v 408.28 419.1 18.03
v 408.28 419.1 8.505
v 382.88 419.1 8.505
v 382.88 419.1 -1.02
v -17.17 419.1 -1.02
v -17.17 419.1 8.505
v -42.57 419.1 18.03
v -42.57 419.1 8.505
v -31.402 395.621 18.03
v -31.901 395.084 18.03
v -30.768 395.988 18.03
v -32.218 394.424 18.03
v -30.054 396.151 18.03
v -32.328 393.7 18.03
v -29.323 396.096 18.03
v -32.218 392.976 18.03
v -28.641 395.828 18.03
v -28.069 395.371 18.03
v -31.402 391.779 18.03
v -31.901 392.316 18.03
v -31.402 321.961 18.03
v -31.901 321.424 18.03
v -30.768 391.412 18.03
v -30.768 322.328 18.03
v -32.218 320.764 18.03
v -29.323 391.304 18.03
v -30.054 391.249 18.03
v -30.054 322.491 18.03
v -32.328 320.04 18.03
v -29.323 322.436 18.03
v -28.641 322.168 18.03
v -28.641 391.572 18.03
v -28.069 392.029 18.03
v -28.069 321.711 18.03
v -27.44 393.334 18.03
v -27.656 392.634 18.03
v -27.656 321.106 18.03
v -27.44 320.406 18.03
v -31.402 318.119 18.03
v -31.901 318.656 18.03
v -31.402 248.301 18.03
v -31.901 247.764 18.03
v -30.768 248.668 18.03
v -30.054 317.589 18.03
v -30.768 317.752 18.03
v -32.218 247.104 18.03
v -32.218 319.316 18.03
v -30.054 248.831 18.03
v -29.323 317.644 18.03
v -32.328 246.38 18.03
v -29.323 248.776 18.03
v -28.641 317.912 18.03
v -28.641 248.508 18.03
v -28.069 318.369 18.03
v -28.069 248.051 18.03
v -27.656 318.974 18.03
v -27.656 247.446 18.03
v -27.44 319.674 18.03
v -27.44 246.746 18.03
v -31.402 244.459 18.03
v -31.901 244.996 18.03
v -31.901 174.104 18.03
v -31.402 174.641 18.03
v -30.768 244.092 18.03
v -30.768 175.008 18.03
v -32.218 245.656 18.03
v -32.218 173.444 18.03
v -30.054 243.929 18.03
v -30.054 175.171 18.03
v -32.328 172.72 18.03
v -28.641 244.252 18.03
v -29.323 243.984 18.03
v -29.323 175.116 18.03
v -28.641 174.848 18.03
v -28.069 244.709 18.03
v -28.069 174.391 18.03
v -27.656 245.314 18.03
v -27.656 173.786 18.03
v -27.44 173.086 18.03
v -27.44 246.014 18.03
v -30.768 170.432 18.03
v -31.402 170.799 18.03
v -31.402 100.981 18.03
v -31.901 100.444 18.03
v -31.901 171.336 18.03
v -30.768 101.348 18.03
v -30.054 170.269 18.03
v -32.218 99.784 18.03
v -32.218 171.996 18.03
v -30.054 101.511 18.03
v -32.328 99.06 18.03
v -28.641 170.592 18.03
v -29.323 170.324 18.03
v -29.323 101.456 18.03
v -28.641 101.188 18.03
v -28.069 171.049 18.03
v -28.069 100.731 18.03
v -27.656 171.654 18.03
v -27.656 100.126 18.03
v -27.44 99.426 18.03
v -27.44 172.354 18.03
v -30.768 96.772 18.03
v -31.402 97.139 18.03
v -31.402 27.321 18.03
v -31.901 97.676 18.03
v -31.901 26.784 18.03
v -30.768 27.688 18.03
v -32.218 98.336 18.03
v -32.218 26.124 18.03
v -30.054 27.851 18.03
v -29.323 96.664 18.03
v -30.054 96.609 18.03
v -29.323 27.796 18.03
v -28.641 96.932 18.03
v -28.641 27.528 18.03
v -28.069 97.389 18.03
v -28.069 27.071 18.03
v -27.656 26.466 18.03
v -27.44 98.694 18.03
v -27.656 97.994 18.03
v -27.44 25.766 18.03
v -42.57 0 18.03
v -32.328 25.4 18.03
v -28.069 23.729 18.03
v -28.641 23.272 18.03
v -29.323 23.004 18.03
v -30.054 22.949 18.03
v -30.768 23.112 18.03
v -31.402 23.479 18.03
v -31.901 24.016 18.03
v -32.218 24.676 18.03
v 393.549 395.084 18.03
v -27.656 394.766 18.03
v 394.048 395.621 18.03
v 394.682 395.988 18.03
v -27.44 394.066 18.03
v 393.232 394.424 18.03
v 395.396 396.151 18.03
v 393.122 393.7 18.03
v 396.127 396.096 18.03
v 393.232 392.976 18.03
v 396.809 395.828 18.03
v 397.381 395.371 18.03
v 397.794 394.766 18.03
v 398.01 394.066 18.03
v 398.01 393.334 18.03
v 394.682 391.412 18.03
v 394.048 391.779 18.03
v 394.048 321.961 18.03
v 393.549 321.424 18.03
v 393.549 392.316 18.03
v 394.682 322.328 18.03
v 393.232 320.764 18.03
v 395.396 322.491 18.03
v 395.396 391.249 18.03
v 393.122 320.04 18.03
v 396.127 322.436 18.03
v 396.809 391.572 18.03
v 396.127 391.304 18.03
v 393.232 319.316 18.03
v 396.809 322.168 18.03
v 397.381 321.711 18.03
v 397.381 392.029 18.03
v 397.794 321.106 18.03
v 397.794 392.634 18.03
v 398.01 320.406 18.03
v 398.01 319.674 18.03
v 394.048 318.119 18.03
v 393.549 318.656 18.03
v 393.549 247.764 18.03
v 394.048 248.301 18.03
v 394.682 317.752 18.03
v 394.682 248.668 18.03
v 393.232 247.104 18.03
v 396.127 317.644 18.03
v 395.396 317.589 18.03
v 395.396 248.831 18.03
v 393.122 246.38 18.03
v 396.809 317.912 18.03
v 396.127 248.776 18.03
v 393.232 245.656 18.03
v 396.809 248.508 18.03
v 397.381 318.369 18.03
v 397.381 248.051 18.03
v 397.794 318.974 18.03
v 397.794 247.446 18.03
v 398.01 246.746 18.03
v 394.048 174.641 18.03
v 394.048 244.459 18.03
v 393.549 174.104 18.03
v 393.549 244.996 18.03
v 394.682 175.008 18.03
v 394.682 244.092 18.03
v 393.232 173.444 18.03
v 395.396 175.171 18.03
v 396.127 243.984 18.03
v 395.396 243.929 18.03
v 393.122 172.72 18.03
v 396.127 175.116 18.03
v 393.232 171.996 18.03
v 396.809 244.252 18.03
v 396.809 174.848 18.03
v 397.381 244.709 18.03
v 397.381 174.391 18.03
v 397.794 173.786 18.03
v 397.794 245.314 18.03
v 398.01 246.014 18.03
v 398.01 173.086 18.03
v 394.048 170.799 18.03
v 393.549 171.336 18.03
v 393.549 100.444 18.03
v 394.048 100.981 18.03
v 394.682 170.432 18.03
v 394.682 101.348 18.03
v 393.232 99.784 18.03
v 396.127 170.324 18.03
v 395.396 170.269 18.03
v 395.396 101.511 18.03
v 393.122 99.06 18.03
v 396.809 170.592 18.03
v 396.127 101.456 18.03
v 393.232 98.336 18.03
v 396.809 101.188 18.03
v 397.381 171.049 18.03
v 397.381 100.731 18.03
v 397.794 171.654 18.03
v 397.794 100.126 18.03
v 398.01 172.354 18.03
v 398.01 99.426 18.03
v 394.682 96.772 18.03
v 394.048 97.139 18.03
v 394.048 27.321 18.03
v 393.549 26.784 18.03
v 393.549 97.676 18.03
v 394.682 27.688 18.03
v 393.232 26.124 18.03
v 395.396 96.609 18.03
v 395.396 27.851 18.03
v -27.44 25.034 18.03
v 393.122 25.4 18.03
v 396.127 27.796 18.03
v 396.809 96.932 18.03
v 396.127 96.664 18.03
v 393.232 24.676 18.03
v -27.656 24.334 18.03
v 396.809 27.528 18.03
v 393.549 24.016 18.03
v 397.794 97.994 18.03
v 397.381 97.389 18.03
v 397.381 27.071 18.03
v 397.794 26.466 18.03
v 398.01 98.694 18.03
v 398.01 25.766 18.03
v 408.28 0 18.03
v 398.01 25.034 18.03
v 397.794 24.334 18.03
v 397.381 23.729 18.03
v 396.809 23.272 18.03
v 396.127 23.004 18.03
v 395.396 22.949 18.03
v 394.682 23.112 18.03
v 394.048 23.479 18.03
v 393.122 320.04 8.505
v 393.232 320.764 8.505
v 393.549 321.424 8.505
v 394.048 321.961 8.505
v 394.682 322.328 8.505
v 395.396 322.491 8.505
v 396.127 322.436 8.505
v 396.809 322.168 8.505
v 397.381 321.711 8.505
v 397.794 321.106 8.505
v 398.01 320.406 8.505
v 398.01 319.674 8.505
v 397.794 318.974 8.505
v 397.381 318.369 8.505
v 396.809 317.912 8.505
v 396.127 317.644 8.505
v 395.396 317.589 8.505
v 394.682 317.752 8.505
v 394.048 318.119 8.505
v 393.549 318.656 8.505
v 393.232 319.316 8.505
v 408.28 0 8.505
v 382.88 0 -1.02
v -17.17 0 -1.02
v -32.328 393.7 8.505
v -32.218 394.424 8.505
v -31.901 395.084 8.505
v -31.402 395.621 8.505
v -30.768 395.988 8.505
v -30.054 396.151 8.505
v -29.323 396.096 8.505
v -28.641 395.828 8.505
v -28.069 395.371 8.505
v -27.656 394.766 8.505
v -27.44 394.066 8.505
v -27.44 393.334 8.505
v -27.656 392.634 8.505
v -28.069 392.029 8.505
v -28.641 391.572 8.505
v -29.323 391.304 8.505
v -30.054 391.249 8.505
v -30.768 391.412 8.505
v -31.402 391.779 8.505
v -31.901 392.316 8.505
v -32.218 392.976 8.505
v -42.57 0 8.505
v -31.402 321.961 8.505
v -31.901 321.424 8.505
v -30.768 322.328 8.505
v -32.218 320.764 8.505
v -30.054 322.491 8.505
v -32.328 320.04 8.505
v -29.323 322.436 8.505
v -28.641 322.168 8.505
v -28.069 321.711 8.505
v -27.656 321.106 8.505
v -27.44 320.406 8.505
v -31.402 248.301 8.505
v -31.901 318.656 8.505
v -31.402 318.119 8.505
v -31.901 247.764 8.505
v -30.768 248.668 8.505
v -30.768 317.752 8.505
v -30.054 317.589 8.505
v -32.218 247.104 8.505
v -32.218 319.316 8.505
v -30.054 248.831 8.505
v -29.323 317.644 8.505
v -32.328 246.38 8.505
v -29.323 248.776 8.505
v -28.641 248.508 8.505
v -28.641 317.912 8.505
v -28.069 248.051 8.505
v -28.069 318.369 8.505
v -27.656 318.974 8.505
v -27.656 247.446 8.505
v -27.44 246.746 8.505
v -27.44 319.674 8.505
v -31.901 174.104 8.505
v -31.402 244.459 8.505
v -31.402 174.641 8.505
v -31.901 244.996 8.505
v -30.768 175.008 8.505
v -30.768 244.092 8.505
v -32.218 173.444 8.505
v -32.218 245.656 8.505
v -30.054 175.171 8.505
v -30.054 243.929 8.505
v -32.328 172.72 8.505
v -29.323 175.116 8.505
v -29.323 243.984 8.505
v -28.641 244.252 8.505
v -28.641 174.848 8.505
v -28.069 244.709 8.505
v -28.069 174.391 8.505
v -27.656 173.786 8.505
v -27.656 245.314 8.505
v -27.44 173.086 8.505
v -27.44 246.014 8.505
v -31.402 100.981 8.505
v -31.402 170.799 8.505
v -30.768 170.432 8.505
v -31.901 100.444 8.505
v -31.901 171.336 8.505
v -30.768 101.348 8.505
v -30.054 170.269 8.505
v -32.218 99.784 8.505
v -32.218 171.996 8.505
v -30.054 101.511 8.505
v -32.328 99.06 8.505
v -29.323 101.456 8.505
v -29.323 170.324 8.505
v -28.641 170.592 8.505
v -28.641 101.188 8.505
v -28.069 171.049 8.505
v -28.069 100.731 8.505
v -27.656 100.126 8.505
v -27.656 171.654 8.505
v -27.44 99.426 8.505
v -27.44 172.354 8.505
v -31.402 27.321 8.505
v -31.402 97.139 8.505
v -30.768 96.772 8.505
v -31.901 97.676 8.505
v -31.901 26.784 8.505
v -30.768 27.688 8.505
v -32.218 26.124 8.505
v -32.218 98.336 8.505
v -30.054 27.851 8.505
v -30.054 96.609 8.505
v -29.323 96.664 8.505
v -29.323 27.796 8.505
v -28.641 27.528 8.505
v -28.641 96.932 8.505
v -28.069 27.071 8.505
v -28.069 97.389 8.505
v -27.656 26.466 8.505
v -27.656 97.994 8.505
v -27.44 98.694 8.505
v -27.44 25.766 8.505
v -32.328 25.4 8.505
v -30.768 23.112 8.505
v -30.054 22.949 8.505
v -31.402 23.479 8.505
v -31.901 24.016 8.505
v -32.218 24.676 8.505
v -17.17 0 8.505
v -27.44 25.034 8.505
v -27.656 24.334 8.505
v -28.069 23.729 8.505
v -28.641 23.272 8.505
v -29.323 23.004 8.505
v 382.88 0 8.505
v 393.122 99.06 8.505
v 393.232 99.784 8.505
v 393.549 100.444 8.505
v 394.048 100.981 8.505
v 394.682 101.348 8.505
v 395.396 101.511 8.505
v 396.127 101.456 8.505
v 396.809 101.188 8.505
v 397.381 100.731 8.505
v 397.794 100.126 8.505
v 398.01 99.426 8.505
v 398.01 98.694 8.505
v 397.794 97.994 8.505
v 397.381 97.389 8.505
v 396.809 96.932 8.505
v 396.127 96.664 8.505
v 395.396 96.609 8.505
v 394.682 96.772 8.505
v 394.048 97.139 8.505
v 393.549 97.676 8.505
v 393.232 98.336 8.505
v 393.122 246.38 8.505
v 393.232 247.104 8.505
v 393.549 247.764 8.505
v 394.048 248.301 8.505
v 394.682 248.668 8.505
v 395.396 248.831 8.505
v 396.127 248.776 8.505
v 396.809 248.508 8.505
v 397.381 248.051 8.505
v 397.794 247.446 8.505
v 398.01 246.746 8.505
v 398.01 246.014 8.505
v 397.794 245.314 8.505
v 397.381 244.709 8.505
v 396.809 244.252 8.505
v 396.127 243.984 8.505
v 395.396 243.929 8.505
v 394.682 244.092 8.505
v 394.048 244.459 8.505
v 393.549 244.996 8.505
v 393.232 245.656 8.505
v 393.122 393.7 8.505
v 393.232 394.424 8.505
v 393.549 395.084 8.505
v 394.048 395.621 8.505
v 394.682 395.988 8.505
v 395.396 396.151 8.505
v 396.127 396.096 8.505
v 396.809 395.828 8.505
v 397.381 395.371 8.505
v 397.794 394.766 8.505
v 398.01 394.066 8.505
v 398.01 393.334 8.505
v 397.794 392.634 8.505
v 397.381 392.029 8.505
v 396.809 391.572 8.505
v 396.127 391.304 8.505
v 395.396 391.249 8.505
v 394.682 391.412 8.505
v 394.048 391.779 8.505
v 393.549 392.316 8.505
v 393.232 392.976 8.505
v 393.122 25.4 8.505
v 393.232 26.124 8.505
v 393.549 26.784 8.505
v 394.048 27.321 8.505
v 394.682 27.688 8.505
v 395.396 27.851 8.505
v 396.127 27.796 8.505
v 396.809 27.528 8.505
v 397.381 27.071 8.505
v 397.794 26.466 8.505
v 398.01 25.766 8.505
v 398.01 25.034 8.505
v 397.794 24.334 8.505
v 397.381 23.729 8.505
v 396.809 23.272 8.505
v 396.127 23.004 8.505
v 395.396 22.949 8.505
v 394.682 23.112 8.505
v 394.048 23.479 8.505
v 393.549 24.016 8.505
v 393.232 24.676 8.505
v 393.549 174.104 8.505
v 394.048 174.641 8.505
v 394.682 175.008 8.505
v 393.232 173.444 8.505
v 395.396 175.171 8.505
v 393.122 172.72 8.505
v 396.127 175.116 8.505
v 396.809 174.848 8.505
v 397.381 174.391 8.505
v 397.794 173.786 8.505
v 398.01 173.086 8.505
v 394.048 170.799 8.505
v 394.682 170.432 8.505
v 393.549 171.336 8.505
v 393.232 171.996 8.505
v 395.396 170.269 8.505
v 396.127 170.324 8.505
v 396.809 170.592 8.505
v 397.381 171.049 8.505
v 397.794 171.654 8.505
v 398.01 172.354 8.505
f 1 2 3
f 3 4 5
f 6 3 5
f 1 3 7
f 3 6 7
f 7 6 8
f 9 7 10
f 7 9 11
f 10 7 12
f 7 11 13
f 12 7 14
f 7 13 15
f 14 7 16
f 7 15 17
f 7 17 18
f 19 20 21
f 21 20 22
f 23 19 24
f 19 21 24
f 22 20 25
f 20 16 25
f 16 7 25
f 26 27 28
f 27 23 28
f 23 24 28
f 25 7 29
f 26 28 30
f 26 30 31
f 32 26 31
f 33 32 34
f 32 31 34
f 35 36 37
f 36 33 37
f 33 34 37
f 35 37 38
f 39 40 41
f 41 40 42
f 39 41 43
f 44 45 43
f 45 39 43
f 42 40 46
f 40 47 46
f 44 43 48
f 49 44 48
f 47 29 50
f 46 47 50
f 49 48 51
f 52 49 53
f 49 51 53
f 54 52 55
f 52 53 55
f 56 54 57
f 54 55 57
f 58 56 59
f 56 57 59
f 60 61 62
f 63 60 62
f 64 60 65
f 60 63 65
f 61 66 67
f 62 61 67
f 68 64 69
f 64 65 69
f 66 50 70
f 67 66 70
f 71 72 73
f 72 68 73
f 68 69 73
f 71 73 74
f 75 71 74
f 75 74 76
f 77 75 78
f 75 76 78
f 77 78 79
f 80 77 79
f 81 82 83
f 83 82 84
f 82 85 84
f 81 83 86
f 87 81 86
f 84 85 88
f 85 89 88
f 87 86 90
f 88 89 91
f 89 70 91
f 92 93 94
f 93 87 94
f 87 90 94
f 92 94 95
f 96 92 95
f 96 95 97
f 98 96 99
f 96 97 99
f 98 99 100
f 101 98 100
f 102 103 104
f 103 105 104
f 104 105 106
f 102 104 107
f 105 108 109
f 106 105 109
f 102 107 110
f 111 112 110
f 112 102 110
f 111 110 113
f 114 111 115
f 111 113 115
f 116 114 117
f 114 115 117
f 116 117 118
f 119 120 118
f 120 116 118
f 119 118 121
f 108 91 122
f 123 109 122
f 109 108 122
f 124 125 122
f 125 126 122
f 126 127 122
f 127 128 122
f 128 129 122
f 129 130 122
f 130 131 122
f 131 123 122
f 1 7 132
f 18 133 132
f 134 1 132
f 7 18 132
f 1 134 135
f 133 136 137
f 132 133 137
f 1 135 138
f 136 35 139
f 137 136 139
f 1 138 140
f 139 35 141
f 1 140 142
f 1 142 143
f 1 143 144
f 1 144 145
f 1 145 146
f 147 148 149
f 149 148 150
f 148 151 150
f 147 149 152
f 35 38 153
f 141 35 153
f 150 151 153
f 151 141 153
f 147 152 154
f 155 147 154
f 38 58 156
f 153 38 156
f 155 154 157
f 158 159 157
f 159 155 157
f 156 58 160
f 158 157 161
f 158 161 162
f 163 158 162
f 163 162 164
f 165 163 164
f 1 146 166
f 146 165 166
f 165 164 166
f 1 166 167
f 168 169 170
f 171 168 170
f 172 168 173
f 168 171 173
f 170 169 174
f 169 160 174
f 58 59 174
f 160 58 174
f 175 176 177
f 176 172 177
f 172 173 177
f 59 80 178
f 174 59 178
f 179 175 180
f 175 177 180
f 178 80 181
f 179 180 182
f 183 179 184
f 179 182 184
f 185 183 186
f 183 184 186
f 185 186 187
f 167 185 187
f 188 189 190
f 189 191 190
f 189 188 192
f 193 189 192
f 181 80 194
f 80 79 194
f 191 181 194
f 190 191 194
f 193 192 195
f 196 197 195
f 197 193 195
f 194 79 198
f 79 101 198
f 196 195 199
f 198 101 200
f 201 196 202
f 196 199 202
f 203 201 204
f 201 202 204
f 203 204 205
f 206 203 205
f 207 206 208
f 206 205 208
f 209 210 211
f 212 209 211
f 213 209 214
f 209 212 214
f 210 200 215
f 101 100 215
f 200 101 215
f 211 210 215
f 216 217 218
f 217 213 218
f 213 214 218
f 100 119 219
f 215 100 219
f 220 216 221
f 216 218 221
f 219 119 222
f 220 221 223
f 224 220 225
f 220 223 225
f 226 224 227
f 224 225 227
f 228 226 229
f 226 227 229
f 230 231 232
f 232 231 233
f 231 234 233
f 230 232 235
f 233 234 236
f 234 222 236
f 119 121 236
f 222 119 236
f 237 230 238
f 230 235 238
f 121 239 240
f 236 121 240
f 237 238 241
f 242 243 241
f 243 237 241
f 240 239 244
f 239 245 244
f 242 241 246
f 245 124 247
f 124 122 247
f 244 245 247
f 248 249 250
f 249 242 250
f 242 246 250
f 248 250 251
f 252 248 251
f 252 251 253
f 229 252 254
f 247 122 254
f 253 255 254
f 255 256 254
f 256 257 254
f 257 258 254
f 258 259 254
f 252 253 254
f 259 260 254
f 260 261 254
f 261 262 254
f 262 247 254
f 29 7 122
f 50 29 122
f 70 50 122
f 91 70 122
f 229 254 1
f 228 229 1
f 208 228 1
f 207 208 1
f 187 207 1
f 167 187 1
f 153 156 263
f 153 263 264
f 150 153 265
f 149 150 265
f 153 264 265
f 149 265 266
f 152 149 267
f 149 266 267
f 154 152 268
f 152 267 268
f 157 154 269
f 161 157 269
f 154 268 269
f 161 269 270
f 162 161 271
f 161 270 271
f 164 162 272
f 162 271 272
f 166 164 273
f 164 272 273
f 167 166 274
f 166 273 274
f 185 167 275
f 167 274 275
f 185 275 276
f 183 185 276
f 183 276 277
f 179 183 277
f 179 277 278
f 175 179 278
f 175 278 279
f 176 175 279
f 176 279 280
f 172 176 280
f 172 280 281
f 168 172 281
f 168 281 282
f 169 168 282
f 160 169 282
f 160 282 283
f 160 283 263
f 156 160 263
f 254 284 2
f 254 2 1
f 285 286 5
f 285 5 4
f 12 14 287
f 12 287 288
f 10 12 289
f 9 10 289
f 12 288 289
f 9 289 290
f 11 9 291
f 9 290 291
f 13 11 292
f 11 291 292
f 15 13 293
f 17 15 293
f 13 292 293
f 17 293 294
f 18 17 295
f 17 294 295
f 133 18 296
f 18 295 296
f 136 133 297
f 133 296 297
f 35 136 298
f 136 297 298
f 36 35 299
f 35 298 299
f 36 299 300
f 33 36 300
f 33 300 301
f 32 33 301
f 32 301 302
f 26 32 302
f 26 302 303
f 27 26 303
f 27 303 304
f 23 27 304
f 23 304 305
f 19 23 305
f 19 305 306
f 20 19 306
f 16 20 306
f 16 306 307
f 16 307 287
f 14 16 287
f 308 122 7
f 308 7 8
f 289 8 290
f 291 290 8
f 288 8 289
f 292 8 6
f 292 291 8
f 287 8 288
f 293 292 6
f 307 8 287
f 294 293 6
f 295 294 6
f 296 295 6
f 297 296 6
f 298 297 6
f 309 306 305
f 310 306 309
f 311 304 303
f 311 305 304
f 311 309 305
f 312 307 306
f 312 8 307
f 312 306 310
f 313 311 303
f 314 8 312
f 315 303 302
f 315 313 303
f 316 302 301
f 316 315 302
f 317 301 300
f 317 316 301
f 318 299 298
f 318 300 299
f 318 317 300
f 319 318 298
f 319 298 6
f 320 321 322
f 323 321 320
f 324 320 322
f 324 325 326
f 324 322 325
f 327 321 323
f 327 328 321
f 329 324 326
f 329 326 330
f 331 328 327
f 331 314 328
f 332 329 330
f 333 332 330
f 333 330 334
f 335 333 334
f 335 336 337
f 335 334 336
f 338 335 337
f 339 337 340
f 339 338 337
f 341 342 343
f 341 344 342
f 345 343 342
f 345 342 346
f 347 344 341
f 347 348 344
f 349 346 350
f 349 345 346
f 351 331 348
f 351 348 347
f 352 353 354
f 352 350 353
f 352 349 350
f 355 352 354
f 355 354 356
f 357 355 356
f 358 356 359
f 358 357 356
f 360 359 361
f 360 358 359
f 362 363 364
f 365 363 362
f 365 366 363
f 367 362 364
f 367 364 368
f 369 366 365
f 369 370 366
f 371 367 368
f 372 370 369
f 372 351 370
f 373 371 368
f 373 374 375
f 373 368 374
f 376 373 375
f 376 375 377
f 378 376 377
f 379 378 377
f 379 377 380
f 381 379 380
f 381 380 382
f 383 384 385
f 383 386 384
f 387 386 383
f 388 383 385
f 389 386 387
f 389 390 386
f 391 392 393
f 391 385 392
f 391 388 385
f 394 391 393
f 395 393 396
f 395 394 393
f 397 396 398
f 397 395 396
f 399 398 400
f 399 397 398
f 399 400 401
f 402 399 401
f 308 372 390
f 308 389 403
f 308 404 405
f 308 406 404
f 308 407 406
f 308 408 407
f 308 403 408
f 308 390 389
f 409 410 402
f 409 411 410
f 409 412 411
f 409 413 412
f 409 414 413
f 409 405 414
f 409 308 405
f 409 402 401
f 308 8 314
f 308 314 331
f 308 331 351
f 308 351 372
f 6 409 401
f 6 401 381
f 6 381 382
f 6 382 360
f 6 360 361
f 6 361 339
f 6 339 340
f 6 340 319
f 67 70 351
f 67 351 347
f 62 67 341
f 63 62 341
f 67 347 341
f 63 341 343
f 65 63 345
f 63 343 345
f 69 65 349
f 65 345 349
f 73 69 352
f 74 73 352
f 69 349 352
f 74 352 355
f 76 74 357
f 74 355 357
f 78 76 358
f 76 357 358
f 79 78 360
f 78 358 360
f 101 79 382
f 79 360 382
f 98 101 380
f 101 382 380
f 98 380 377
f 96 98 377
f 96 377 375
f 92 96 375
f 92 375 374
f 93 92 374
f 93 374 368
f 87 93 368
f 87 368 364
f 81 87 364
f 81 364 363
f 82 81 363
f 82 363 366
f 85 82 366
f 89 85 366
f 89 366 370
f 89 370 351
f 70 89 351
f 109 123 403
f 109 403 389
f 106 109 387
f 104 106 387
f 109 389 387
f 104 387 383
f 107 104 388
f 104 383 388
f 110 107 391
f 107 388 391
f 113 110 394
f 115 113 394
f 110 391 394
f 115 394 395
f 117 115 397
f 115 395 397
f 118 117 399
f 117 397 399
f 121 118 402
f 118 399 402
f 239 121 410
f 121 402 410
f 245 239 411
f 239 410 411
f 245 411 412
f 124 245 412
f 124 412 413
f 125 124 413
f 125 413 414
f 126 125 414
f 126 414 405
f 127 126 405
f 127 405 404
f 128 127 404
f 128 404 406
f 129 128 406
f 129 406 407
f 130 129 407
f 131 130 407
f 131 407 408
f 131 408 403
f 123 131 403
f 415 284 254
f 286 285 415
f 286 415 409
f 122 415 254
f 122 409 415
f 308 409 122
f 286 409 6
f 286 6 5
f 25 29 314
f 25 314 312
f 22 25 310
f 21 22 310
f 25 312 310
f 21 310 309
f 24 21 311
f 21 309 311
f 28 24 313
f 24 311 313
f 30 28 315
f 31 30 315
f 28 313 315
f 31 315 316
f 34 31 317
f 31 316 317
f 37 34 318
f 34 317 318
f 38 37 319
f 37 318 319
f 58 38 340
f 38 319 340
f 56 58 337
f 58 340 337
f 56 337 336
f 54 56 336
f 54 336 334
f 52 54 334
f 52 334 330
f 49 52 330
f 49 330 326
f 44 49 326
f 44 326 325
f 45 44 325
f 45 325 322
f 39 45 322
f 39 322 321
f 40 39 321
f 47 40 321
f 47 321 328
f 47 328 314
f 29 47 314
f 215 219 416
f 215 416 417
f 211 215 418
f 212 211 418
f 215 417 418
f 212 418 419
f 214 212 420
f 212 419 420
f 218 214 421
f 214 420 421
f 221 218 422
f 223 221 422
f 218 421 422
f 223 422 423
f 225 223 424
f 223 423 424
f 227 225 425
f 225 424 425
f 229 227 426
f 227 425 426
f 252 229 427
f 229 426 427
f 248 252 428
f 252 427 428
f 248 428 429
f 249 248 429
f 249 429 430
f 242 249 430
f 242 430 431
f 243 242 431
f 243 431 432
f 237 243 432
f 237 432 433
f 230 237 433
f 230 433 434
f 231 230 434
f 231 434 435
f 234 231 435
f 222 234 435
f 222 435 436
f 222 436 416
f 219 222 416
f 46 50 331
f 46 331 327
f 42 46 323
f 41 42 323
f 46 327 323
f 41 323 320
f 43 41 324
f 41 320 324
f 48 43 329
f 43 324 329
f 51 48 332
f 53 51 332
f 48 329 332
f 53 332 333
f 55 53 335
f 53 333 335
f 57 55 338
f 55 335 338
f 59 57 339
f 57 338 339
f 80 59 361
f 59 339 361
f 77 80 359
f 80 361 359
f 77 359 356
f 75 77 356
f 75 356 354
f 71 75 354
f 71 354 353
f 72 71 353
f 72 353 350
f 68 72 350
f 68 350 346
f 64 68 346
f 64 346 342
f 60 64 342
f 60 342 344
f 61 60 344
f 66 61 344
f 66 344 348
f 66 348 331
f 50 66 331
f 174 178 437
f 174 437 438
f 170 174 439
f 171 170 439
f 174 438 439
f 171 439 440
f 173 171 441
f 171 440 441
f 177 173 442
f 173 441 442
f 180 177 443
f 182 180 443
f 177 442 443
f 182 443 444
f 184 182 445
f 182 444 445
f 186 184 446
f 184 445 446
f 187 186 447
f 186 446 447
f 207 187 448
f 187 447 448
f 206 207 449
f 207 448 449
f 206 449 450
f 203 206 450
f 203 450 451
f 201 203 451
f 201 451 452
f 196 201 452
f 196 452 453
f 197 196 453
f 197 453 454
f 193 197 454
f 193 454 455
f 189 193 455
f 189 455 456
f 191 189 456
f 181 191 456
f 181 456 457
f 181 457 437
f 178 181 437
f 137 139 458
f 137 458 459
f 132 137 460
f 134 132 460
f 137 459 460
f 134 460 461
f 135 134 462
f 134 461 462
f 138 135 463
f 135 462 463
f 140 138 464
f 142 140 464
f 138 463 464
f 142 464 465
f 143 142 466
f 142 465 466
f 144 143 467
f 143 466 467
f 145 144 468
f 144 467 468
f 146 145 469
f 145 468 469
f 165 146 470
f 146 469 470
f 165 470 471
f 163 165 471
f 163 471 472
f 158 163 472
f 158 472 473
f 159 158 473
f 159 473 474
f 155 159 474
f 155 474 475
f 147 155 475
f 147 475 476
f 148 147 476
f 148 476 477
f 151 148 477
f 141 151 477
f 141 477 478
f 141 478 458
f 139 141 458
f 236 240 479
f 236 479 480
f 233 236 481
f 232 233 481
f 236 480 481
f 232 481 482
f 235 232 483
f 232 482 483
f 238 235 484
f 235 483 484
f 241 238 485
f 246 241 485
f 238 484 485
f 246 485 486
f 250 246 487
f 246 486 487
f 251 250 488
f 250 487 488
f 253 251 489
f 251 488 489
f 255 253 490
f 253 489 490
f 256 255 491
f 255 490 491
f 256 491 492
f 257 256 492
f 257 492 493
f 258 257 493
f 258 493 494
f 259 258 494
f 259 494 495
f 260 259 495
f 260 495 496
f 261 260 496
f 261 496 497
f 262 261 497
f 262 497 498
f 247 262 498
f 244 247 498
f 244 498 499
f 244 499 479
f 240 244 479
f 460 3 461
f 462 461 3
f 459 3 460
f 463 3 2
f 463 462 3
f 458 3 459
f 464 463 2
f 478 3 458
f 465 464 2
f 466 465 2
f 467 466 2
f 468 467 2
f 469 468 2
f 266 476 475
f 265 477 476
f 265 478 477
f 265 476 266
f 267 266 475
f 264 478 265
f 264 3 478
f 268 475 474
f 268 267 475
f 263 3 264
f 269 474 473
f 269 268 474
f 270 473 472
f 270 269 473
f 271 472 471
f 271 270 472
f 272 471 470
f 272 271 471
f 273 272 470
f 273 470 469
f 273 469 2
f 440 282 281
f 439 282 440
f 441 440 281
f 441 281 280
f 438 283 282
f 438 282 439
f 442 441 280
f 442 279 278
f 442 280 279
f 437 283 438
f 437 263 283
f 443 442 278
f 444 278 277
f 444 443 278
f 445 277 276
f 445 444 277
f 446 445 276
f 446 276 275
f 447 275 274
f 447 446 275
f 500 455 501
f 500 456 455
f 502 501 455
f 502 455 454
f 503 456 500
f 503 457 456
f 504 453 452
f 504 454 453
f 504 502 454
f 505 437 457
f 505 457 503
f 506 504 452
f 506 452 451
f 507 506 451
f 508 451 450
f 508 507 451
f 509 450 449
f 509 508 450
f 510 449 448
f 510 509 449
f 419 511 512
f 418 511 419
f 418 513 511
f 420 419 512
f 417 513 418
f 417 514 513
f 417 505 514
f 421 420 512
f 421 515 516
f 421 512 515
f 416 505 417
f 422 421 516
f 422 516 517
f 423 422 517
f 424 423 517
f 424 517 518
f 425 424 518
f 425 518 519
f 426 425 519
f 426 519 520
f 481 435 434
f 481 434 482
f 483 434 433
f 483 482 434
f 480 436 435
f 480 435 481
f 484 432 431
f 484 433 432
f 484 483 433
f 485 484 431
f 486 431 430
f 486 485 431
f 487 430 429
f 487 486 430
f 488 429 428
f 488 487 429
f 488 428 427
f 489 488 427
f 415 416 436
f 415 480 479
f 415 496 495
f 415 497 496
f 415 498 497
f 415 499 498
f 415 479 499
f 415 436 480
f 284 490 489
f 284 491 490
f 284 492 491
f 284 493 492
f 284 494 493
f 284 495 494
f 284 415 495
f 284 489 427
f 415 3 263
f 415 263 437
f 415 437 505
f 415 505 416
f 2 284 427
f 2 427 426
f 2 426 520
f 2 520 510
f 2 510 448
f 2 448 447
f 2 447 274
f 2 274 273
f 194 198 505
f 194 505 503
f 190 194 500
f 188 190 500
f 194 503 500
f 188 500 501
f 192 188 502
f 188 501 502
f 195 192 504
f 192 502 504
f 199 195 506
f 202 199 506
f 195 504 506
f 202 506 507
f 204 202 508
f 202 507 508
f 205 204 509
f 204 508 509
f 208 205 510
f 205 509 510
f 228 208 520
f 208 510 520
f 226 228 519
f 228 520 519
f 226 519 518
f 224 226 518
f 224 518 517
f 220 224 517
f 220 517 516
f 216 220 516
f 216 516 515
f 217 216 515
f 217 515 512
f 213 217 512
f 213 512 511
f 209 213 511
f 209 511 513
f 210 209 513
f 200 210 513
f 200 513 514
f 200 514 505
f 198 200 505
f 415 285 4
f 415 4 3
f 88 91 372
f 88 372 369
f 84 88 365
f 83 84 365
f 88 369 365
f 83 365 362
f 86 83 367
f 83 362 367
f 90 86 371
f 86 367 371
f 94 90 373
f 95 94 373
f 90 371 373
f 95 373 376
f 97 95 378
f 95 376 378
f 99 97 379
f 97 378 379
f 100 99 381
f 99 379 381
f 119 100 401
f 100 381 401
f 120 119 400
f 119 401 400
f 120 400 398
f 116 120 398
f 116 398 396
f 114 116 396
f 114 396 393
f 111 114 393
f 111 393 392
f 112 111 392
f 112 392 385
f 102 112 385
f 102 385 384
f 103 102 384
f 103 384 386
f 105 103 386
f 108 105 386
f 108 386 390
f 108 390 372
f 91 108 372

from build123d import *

# Parameters (mm, degrees)
BOSS_EXTRUDE1_DEPTH       = 419.1
F_8_CLEARANCE_HOLE1_D     = 4.9149
F_8_CLEARANCE_HOLE1_DEPTH = 9.652
F_8_CLEARANCE_HOLE1_TIP   = 1.476584928


with BuildPart() as part:
    # Sketch1 → Boss-Extrude1 (new body)
    with BuildSketch(Plane(origin=(0, 0, 0), x_dir=(1, 0, 0), z_dir=(0, 1, 0))):
        Polygon((-17.170187141, 1.020273681), (382.879812859, 1.020273681), (382.879812859, -8.504726319), (408.279812859, -8.504726319), (408.279812859, -18.029726319), (382.879812859, -18.029726319), (-17.170187141, -18.029726319), (-42.570187141, -18.029726319), (-42.570187141, -8.504726319), (-17.170187141, -8.504726319), align=None)
    extrude(amount=BOSS_EXTRUDE1_DEPTH)

    # #8 Clearance Hole1
    with Locations(Plane.XY.offset(18.029726319)):
        with Locations((-29.870187141, 393.7), (-29.870187141, 320.04), (-29.870187141, 246.38), (-29.870187141, 172.72), (-29.870187141, 99.06), (-29.870187141, 25.4), (395.579812859, 25.4), (395.579812859, 99.06), (395.579812859, 172.72), (395.579812859, 246.38), (395.579812859, 320.04), (395.579812859, 393.7)):
            Hole(F_8_CLEARANCE_HOLE1_D / 2, depth=F_8_CLEARANCE_HOLE1_DEPTH)
            with Locations((0, 0, -(F_8_CLEARANCE_HOLE1_DEPTH + F_8_CLEARANCE_HOLE1_TIP / 2))):  # 118° drill point
                Cone(0, F_8_CLEARANCE_HOLE1_D / 2, F_8_CLEARANCE_HOLE1_TIP, mode=Mode.SUBTRACT)


solid = part.part
